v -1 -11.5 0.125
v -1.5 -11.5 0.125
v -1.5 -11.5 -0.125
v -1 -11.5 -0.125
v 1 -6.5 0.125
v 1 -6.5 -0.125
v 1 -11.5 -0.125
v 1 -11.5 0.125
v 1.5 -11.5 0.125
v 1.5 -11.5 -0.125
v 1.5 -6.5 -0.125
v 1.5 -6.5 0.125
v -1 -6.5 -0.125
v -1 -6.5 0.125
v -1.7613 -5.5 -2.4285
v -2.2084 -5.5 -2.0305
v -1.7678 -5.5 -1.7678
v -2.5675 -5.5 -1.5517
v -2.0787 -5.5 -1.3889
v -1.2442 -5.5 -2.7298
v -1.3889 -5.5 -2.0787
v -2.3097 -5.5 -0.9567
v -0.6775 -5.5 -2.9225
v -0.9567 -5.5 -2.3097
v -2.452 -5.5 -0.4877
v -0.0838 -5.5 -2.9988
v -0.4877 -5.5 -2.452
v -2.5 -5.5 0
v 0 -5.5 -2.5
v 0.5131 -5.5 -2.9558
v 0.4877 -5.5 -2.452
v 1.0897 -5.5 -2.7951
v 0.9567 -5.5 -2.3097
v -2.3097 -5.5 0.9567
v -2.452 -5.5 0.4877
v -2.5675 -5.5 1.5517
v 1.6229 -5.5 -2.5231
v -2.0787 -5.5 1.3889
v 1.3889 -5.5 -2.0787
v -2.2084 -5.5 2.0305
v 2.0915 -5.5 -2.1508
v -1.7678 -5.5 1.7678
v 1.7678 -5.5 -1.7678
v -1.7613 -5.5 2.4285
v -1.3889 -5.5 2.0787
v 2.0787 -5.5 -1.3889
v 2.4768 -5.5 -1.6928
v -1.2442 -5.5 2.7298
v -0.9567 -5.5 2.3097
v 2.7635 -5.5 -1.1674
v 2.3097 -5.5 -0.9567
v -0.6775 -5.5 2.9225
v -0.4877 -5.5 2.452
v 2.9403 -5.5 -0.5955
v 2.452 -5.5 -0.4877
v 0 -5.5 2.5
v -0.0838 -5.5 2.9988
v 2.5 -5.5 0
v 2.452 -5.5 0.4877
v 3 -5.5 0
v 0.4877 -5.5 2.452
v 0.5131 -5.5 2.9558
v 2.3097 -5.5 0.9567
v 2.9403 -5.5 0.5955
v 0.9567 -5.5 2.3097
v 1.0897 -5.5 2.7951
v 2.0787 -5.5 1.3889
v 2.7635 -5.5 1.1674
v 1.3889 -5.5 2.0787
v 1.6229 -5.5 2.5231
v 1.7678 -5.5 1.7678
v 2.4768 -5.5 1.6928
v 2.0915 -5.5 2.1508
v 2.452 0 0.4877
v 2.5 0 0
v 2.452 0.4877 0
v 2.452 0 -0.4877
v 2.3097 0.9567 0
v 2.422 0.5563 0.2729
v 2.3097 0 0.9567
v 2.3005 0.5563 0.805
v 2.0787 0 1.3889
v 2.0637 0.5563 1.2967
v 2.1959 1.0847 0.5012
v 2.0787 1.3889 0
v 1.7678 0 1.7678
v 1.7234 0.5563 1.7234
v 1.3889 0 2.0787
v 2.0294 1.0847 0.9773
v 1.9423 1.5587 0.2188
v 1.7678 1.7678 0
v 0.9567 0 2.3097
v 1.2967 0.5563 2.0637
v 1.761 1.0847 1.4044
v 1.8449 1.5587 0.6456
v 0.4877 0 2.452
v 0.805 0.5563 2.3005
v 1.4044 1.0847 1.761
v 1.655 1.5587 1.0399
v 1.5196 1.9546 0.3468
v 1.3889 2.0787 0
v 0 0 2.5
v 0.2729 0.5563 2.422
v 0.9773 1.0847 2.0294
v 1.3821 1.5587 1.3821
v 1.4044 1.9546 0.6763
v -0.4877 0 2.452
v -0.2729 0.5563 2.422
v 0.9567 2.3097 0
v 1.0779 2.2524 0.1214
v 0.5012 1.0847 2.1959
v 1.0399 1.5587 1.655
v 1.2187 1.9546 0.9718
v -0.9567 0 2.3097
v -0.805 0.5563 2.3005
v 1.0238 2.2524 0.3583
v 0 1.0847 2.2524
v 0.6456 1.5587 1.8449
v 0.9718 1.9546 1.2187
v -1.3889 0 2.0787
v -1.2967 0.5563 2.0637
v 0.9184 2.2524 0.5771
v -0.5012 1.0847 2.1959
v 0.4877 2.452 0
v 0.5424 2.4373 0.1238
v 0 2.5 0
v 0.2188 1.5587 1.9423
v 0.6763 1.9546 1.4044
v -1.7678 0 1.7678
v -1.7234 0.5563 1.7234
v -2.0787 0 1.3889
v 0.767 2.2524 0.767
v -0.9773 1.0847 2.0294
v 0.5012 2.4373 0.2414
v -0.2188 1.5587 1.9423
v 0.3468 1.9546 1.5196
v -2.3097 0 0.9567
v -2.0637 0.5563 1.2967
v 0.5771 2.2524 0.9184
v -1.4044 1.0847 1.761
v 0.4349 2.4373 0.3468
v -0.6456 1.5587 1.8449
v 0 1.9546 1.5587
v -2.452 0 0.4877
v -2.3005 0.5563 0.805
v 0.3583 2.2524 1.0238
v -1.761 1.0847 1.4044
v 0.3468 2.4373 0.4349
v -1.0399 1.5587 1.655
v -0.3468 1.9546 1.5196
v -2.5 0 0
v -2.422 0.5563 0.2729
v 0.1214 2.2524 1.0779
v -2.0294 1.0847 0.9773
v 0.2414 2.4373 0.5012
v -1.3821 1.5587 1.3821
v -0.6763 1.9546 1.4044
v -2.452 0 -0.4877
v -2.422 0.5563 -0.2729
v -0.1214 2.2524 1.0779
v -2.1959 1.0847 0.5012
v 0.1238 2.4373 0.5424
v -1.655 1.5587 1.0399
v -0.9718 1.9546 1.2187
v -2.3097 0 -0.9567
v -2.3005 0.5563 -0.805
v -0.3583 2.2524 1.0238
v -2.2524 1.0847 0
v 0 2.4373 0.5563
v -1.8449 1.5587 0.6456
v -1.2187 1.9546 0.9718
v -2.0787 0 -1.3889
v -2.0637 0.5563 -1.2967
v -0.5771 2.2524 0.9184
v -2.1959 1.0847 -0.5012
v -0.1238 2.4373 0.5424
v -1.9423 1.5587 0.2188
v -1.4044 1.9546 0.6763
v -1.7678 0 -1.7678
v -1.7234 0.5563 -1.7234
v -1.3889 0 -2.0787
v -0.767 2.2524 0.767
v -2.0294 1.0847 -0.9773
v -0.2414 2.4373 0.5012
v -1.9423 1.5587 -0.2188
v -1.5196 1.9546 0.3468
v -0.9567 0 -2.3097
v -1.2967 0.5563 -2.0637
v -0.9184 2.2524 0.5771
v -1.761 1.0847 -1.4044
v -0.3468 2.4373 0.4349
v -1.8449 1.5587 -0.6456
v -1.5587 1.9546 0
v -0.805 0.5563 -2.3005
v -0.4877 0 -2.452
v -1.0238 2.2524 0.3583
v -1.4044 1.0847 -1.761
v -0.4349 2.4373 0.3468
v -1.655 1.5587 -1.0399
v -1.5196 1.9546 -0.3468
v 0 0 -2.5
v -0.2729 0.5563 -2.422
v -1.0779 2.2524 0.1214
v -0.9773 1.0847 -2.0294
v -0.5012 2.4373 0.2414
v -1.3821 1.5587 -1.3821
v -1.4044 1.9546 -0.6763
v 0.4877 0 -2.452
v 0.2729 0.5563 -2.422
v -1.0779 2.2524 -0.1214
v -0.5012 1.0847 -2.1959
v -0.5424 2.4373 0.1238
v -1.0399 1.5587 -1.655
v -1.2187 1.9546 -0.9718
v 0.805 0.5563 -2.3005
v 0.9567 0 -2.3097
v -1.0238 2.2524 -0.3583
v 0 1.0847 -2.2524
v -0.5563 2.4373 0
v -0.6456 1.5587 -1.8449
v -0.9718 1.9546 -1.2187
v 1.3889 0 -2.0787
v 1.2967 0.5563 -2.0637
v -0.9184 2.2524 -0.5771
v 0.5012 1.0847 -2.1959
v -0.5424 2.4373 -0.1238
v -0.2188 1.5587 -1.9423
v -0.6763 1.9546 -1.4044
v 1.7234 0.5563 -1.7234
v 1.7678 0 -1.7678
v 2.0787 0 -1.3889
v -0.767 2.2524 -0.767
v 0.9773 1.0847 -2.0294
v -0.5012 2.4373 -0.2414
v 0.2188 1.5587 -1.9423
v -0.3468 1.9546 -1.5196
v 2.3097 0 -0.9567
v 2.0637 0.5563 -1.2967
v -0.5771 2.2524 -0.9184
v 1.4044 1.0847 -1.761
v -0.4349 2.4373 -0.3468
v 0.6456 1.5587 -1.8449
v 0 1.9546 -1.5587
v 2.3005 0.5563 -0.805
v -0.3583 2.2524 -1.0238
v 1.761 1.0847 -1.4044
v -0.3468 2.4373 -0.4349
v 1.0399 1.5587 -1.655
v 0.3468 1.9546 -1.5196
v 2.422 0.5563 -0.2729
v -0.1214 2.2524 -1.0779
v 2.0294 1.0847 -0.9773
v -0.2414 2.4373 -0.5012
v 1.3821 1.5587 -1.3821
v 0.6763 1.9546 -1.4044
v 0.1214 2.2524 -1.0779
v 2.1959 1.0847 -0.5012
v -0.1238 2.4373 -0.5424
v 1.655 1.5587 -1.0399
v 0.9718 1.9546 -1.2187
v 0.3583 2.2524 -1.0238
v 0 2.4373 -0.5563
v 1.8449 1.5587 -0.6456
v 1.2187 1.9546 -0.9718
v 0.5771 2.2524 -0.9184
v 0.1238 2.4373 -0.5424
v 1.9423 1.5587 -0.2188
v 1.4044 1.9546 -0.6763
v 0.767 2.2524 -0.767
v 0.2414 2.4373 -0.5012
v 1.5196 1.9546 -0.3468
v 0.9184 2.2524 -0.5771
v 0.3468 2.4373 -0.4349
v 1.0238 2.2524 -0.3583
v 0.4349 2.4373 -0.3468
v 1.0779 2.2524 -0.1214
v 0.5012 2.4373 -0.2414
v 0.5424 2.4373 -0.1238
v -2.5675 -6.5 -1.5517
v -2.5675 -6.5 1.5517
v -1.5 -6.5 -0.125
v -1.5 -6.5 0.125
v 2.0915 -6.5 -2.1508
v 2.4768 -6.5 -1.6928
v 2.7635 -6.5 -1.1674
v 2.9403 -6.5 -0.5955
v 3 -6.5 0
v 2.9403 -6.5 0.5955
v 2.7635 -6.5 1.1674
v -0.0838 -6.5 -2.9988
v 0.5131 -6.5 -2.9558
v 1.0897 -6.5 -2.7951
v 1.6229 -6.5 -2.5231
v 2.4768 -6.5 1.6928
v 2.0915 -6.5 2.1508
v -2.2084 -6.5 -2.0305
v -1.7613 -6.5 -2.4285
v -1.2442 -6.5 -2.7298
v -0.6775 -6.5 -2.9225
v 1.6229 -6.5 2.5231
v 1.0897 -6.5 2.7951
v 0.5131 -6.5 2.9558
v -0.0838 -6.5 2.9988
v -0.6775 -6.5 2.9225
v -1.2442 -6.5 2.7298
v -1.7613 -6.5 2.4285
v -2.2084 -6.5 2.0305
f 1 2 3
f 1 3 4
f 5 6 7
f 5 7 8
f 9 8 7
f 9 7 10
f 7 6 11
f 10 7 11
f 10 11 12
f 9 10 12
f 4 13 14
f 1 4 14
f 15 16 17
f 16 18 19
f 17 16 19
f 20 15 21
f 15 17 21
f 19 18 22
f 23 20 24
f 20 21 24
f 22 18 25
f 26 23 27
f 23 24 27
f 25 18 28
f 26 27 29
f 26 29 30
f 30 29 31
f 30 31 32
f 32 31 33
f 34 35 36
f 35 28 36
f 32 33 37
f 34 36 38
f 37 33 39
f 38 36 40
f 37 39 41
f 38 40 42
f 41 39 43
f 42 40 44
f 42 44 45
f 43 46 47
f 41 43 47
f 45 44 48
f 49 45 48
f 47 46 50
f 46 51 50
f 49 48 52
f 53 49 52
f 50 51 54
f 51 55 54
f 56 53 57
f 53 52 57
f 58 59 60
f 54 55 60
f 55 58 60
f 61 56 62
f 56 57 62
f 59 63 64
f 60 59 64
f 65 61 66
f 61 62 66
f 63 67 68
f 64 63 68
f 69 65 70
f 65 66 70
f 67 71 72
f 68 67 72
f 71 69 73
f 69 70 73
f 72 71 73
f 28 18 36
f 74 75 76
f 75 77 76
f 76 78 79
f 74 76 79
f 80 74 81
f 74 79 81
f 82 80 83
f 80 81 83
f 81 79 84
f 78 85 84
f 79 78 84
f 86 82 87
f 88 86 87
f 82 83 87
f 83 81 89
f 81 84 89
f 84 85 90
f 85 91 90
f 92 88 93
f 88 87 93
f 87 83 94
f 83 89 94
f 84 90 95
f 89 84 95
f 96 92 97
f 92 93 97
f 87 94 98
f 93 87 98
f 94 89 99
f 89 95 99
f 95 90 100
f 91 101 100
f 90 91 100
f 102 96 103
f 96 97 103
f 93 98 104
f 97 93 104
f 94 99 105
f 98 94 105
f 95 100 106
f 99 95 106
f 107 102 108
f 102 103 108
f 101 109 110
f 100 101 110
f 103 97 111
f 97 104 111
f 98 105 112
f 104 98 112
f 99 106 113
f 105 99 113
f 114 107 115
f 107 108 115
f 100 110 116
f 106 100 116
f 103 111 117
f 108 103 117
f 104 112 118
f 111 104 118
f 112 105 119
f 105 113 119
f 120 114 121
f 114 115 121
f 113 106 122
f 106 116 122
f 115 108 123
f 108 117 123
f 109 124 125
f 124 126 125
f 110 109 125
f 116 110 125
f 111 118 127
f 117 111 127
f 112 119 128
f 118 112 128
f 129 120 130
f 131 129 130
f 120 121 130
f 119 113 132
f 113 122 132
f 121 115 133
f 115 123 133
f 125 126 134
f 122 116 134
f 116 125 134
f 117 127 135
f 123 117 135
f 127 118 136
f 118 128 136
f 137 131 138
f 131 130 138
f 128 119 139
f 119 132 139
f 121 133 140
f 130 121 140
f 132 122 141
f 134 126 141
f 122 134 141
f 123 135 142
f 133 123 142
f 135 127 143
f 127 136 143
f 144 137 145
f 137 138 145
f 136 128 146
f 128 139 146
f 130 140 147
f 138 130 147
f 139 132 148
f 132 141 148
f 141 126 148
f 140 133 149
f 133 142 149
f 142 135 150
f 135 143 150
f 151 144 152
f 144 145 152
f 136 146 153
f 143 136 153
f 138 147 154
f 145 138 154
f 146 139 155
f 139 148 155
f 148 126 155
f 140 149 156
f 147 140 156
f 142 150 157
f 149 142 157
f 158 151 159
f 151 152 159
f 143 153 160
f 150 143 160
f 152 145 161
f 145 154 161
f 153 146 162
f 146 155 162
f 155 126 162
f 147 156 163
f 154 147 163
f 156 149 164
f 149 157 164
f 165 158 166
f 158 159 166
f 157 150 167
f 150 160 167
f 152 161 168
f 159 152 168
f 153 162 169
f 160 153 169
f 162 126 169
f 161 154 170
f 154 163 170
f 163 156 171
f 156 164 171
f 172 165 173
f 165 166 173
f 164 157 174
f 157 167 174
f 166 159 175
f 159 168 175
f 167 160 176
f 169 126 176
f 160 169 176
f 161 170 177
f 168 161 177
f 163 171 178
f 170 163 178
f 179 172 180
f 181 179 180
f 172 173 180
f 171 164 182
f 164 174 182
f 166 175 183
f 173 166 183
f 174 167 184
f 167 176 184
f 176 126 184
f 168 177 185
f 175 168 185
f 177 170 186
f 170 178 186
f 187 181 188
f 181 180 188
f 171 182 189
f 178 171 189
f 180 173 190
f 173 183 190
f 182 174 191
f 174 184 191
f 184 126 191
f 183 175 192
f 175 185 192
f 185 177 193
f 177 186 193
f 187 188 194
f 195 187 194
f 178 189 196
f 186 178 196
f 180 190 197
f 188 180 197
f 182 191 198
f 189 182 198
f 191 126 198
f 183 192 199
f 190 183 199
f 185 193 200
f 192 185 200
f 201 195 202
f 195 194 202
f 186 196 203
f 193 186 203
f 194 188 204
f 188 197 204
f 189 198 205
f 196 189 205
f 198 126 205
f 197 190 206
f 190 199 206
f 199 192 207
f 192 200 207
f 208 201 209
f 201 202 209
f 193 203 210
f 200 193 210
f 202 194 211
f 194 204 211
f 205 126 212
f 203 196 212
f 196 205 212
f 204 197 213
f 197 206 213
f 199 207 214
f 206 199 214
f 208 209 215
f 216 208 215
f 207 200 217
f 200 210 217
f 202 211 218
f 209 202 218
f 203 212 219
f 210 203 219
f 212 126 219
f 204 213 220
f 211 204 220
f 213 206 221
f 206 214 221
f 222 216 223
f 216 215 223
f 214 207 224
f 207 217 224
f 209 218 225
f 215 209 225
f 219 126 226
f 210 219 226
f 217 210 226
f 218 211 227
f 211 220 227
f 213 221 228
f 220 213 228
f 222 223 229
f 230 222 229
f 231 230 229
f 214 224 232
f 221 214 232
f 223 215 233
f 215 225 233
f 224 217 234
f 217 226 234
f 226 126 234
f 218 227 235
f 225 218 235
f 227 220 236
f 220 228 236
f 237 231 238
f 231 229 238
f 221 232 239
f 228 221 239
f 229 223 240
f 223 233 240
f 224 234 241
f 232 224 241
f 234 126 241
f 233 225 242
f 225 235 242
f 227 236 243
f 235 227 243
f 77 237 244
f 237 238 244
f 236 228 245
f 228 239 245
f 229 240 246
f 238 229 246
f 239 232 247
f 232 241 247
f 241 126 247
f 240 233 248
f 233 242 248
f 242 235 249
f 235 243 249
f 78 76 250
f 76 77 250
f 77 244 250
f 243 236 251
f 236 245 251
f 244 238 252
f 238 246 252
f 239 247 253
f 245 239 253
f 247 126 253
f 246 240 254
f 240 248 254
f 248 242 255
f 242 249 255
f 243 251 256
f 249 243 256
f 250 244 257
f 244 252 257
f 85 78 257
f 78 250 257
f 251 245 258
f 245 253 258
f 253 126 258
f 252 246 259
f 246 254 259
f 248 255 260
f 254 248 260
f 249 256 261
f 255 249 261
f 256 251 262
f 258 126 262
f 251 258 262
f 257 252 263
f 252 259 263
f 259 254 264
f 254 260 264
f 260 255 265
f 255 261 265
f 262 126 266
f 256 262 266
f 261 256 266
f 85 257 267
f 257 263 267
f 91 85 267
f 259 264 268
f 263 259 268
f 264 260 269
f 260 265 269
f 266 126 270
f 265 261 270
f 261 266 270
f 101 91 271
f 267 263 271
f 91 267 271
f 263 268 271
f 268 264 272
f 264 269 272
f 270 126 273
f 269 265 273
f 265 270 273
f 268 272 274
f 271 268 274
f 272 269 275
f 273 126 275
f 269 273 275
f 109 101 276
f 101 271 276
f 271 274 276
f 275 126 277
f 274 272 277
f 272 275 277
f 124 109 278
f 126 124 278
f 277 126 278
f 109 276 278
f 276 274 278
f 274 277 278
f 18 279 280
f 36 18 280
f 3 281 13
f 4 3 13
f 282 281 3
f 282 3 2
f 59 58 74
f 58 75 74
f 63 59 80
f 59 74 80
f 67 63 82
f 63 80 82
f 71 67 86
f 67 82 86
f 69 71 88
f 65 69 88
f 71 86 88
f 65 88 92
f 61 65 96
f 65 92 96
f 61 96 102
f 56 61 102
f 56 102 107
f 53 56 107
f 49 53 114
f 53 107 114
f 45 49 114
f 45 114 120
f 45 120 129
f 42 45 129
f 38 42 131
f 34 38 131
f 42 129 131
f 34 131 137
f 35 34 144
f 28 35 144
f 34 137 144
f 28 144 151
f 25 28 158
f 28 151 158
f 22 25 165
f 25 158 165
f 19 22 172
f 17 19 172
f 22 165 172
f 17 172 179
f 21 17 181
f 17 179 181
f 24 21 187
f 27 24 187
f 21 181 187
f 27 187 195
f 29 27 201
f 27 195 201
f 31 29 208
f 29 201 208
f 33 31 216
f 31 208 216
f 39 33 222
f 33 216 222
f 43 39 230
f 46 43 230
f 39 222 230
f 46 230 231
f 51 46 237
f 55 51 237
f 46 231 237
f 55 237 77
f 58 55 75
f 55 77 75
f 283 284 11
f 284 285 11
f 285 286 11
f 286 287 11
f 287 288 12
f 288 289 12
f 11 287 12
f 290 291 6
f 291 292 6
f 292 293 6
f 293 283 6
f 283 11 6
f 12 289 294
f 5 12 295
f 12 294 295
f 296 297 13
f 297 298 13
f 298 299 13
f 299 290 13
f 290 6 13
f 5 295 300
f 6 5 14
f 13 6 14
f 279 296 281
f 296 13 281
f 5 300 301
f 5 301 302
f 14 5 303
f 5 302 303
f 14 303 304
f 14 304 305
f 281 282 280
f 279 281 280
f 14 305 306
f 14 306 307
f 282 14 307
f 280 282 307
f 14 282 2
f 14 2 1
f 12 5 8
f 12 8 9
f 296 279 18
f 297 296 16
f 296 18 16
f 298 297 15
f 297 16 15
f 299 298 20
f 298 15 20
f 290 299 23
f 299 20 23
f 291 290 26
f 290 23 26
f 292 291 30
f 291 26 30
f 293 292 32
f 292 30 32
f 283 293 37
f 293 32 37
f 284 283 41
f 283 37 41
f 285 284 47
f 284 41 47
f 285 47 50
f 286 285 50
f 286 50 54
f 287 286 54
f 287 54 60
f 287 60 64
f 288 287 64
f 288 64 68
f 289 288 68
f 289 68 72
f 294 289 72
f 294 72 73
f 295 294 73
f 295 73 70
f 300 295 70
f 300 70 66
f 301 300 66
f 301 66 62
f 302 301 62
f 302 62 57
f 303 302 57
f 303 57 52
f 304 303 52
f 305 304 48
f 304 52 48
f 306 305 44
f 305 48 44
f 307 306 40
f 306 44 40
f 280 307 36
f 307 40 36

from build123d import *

# Parameters (mm, degrees)
SKETCH4_W       = 0.5
SKETCH4_H       = 3.5
EXTRUDE4_DEPTH  = 2
SKETCH2_W       = 0.5
SKETCH2_H       = 0.25
EXTRUDE_1_DEPTH = 5


with BuildPart() as part:
    # Sketch1 → Revolve1 (revolve)
    with BuildSketch(Plane.XY):
        with BuildLine():
            Line((0, 2.5), (0, -5.5))
            Line((0, -5.5), (0, -6.5))
            Line((0, -6.5), (3, -6.5))
            Line((3, -6.5), (3, -5.5))
            Line((3, -5.5), (2.5, -5.5))
            Line((2.5, -5.5), (2.5, 0))
            ThreePointArc((2.5, 0), (1.767766953, 1.767766953), (0, 2.5))
        make_face()
    revolve(axis=Axis((0, 40.48125, 0), (0, -1, 0)))

    # Sketch4 → Extrude4 (cut)
    with BuildSketch(Plane.XZ.offset(6.5)):
        with Locations((-2.817517664, 0)):
            Rectangle(SKETCH4_W, SKETCH4_H)
    extrude(amount=-EXTRUDE4_DEPTH, mode=Mode.SUBTRACT)

    # Sketch2 → 凸台-拉伸1 (add)
    with BuildSketch(Plane.XZ.offset(6.5)):
        with Locations((1.25, 0)):
            Rectangle(SKETCH2_W, SKETCH2_H)
        with Locations((-1.25, 0)):
            Rectangle(SKETCH2_W, SKETCH2_H)
    extrude(amount=EXTRUDE_1_DEPTH)


solid = part.part
